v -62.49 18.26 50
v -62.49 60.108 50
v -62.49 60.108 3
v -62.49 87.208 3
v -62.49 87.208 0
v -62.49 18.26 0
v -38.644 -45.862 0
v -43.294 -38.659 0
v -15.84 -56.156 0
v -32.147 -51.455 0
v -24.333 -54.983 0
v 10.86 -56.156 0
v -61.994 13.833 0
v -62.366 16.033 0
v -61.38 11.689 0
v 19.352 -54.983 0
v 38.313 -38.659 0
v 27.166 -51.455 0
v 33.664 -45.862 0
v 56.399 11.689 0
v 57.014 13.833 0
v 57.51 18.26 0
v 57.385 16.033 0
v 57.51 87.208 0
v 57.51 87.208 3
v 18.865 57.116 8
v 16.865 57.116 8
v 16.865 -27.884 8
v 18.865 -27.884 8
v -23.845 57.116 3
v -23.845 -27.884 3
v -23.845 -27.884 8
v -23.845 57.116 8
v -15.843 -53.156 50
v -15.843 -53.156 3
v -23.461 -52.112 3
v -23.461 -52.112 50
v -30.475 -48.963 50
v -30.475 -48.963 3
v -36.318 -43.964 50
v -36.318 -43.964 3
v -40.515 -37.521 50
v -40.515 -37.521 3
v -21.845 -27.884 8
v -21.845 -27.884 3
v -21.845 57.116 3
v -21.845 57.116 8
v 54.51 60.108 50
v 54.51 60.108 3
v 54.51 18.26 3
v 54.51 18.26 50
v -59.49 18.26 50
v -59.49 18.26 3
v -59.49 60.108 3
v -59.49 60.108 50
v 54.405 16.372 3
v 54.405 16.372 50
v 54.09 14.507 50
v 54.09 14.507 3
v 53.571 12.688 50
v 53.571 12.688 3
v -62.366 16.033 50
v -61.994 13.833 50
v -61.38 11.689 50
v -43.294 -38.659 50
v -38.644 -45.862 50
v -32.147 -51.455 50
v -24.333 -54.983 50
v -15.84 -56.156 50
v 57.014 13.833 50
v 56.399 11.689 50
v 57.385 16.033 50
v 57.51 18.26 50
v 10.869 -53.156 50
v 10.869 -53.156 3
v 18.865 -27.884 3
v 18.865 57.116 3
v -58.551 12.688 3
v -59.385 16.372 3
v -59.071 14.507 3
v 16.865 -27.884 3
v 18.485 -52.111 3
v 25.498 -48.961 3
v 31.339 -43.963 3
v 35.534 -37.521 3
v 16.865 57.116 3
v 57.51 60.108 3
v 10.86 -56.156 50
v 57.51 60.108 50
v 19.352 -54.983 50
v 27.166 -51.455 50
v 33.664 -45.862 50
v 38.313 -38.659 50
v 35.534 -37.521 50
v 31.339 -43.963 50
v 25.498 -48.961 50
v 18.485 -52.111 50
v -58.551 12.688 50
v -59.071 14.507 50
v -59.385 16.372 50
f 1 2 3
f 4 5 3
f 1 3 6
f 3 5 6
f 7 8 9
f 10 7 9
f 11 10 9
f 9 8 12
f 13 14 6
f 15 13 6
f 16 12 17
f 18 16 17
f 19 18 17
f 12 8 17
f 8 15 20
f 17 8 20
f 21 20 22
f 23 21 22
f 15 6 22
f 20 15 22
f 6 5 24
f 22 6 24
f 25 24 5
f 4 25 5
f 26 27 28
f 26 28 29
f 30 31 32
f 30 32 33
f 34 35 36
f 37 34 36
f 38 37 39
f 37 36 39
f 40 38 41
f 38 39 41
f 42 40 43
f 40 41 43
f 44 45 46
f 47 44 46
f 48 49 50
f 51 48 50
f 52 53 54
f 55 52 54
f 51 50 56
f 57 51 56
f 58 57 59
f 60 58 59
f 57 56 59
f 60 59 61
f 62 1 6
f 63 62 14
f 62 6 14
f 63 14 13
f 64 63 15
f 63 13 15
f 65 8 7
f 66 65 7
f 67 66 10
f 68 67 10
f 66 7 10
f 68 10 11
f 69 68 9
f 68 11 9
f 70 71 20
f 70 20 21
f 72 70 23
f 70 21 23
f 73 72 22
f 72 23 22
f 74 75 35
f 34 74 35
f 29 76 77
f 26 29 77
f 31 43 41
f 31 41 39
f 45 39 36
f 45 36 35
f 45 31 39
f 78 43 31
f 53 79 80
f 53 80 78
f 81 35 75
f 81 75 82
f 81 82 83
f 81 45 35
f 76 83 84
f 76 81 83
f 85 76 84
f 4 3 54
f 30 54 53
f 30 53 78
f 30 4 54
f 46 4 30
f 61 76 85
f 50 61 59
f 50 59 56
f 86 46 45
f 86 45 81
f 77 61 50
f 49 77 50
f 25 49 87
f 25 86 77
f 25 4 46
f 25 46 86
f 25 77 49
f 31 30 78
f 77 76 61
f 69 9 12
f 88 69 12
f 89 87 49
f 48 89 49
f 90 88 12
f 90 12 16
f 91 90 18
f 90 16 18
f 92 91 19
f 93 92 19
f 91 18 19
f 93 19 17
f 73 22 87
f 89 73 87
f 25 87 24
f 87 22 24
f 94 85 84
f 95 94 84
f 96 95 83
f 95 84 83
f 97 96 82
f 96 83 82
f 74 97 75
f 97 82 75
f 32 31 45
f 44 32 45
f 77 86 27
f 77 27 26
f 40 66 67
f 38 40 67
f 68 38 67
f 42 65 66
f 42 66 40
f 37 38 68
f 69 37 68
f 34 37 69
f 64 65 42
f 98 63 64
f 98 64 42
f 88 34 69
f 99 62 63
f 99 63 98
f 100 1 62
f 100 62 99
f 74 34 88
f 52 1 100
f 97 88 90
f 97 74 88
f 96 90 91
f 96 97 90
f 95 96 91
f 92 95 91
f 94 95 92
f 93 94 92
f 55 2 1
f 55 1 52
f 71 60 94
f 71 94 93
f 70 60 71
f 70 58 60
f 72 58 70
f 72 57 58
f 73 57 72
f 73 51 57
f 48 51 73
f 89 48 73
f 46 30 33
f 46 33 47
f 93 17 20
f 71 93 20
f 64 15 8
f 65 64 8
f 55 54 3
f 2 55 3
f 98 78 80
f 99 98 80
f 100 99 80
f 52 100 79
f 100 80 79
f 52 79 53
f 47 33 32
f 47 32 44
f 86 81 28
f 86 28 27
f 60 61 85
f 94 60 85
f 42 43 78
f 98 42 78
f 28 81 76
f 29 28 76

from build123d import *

# Parameters (mm, degrees)
F0_W     = 2
F0_H     = 85
F0_W_2   = 3.0000019335
F0_H_2   = 27.1
F1_DEPTH = 3
F2_DEPTH = 50
F3_DEPTH = 8


# Not quite as in the source:
# - ends of sketch curves that miss each other by under 0.0002 mm in the source are joined


with BuildPart() as f1:
    # F0 (on Top) → F1 (new body)
    with BuildSketch(Plane.XY):
        with BuildLine():
            Line((54.5097446937, 40.5472581927), (54.5097446937, 60.1075036168))
            Line((54.5097446937, 60.1075036168), (54.5097446937, 87.2075036168))
            Line((54.5097446937, 87.2075036168), (-59.4902514393, 87.2075036168))
            Line((-59.4902514393, 87.2075036168), (-59.4902514393, 60.1075036168))
            Line((-59.4902514393, 60.1075036168), (-59.4902514393, 40.5472581927))
            Line((-59.4902514393, 40.5472581927), (-59.4902514393, 18.2598339378))
            ThreePointArc((-59.4902514393, 18.2598339378), (-59.2538728212, 15.4347680531), (-58.5513104793, 12.6882651386))
            Line((-58.5513104793, 12.6882651386), (-40.5146915017, -37.5214353961))
            ThreePointArc((-40.5146915017, -37.5214353961), (-30.4754938788, -48.962906346), (-15.8429778585, -53.1560222908))
            Line((-15.8429778585, -53.1560222908), (10.8692885058, -53.1560668961))
            ThreePointArc((10.8692885058, -53.1560668961), (25.4978663276, -48.9610815315), (35.534184756, -37.5214353961))
            Line((35.534184756, -37.5214353961), (53.5708037336, 12.6882651386))
            ThreePointArc((53.5708037336, 12.6882651386), (54.2733660755, 15.4347680531), (54.5097446937, 18.2598339378))
            Line((54.5097446937, 18.2598339378), (54.5097446937, 40.5472581927))
        make_face()
        with Locations((-22.8452533728, 14.6164752861)):
            Rectangle(F0_W, F0_H, mode=Mode.SUBTRACT)
        with Locations((17.8647466272, 14.6164752861)):
            Rectangle(F0_W, F0_H, mode=Mode.SUBTRACT)
        with Locations((-60.9902524061, 73.6575036168)):
            Rectangle(F0_W_2, F0_H_2)
        with Locations((56.0097456604, 73.6575036168)):
            Rectangle(F0_W_2, F0_H_2)
    extrude(amount=F1_DEPTH)

    # F0 (on Top) → F2 (join)
    with BuildSketch(Plane.XY):
        with BuildLine():
            Line((-15.8404213062, -56.156068814), (10.8599145605, -56.1560242285))
            ThreePointArc((10.8599145605, -56.1560242285), (27.1664180437, -51.4552481906), (38.3132826454, -38.6588744882))
            Line((38.3132826454, -38.6588744882), (56.3994961696, 11.6888855872))
            ThreePointArc((56.3994961696, 11.6888855872), (57.2302307851, 14.9277918348), (57.5097466272, 18.2598339378))
            Line((57.5097466272, 18.2598339378), (57.5097466272, 40.2075055503))
            Line((57.5097466272, 40.2075055503), (57.5097466272, 60.1075036168))
            Line((57.5097466272, 60.1075036168), (54.5097446937, 60.1075036168))
            Line((54.5097446937, 60.1075036168), (54.5097446937, 40.5472581927))
            Line((54.5097446937, 40.5472581927), (54.5097446937, 18.2598339378))
            ThreePointArc((54.5097446937, 18.2598339378), (54.2733660755, 15.4347680531), (53.5708037336, 12.6882651386))
            Line((53.5708037336, 12.6882651386), (35.534184756, -37.5214353961))
            ThreePointArc((35.534184756, -37.5214353961), (25.4978663276, -48.9610815315), (10.8692885058, -53.1560668961))
            Line((10.8692885058, -53.1560668961), (-15.8429778585, -53.1560222908))
            ThreePointArc((-15.8429778585, -53.1560222908), (-30.4754938788, -48.962906346), (-40.5146915017, -37.5214353961))
            Line((-40.5146915017, -37.5214353961), (-58.5513104793, 12.6882651386))
            ThreePointArc((-58.5513104793, 12.6882651386), (-59.2538728212, 15.4347680531), (-59.4902514393, 18.2598339378))
            Line((-59.4902514393, 18.2598339378), (-59.4902514393, 40.5472581927))
            Line((-59.4902514393, 40.5472581927), (-59.4902514393, 60.1075036168))
            Line((-59.4902514393, 60.1075036168), (-62.4902533728, 60.1075036168))
            Line((-62.4902533728, 60.1075036168), (-62.4902533728, 40.2075055503))
            Line((-62.4902533728, 40.2075055503), (-62.4902533728, 18.2598339378))
            ThreePointArc((-62.4902533728, 18.2598339378), (-62.2107375308, 14.9277918348), (-61.3800029152, 11.6888855872))
            Line((-61.3800029152, 11.6888855872), (-43.293789391, -38.6588744882))
            ThreePointArc((-43.293789391, -38.6588744882), (-32.1469247894, -51.4552481906), (-15.8404213062, -56.156068814))
        make_face()
    extrude(amount=F2_DEPTH)

    # F0 (on Top) → F3 (join)
    with BuildSketch(Plane.XY):
        with Locations((17.8647466272, 14.6164752861)):
            Rectangle(F0_W, F0_H)
        with Locations((-22.8452533728, 14.6164752861)):
            Rectangle(F0_W, F0_H)
    extrude(amount=F3_DEPTH)


solid = f1.part
